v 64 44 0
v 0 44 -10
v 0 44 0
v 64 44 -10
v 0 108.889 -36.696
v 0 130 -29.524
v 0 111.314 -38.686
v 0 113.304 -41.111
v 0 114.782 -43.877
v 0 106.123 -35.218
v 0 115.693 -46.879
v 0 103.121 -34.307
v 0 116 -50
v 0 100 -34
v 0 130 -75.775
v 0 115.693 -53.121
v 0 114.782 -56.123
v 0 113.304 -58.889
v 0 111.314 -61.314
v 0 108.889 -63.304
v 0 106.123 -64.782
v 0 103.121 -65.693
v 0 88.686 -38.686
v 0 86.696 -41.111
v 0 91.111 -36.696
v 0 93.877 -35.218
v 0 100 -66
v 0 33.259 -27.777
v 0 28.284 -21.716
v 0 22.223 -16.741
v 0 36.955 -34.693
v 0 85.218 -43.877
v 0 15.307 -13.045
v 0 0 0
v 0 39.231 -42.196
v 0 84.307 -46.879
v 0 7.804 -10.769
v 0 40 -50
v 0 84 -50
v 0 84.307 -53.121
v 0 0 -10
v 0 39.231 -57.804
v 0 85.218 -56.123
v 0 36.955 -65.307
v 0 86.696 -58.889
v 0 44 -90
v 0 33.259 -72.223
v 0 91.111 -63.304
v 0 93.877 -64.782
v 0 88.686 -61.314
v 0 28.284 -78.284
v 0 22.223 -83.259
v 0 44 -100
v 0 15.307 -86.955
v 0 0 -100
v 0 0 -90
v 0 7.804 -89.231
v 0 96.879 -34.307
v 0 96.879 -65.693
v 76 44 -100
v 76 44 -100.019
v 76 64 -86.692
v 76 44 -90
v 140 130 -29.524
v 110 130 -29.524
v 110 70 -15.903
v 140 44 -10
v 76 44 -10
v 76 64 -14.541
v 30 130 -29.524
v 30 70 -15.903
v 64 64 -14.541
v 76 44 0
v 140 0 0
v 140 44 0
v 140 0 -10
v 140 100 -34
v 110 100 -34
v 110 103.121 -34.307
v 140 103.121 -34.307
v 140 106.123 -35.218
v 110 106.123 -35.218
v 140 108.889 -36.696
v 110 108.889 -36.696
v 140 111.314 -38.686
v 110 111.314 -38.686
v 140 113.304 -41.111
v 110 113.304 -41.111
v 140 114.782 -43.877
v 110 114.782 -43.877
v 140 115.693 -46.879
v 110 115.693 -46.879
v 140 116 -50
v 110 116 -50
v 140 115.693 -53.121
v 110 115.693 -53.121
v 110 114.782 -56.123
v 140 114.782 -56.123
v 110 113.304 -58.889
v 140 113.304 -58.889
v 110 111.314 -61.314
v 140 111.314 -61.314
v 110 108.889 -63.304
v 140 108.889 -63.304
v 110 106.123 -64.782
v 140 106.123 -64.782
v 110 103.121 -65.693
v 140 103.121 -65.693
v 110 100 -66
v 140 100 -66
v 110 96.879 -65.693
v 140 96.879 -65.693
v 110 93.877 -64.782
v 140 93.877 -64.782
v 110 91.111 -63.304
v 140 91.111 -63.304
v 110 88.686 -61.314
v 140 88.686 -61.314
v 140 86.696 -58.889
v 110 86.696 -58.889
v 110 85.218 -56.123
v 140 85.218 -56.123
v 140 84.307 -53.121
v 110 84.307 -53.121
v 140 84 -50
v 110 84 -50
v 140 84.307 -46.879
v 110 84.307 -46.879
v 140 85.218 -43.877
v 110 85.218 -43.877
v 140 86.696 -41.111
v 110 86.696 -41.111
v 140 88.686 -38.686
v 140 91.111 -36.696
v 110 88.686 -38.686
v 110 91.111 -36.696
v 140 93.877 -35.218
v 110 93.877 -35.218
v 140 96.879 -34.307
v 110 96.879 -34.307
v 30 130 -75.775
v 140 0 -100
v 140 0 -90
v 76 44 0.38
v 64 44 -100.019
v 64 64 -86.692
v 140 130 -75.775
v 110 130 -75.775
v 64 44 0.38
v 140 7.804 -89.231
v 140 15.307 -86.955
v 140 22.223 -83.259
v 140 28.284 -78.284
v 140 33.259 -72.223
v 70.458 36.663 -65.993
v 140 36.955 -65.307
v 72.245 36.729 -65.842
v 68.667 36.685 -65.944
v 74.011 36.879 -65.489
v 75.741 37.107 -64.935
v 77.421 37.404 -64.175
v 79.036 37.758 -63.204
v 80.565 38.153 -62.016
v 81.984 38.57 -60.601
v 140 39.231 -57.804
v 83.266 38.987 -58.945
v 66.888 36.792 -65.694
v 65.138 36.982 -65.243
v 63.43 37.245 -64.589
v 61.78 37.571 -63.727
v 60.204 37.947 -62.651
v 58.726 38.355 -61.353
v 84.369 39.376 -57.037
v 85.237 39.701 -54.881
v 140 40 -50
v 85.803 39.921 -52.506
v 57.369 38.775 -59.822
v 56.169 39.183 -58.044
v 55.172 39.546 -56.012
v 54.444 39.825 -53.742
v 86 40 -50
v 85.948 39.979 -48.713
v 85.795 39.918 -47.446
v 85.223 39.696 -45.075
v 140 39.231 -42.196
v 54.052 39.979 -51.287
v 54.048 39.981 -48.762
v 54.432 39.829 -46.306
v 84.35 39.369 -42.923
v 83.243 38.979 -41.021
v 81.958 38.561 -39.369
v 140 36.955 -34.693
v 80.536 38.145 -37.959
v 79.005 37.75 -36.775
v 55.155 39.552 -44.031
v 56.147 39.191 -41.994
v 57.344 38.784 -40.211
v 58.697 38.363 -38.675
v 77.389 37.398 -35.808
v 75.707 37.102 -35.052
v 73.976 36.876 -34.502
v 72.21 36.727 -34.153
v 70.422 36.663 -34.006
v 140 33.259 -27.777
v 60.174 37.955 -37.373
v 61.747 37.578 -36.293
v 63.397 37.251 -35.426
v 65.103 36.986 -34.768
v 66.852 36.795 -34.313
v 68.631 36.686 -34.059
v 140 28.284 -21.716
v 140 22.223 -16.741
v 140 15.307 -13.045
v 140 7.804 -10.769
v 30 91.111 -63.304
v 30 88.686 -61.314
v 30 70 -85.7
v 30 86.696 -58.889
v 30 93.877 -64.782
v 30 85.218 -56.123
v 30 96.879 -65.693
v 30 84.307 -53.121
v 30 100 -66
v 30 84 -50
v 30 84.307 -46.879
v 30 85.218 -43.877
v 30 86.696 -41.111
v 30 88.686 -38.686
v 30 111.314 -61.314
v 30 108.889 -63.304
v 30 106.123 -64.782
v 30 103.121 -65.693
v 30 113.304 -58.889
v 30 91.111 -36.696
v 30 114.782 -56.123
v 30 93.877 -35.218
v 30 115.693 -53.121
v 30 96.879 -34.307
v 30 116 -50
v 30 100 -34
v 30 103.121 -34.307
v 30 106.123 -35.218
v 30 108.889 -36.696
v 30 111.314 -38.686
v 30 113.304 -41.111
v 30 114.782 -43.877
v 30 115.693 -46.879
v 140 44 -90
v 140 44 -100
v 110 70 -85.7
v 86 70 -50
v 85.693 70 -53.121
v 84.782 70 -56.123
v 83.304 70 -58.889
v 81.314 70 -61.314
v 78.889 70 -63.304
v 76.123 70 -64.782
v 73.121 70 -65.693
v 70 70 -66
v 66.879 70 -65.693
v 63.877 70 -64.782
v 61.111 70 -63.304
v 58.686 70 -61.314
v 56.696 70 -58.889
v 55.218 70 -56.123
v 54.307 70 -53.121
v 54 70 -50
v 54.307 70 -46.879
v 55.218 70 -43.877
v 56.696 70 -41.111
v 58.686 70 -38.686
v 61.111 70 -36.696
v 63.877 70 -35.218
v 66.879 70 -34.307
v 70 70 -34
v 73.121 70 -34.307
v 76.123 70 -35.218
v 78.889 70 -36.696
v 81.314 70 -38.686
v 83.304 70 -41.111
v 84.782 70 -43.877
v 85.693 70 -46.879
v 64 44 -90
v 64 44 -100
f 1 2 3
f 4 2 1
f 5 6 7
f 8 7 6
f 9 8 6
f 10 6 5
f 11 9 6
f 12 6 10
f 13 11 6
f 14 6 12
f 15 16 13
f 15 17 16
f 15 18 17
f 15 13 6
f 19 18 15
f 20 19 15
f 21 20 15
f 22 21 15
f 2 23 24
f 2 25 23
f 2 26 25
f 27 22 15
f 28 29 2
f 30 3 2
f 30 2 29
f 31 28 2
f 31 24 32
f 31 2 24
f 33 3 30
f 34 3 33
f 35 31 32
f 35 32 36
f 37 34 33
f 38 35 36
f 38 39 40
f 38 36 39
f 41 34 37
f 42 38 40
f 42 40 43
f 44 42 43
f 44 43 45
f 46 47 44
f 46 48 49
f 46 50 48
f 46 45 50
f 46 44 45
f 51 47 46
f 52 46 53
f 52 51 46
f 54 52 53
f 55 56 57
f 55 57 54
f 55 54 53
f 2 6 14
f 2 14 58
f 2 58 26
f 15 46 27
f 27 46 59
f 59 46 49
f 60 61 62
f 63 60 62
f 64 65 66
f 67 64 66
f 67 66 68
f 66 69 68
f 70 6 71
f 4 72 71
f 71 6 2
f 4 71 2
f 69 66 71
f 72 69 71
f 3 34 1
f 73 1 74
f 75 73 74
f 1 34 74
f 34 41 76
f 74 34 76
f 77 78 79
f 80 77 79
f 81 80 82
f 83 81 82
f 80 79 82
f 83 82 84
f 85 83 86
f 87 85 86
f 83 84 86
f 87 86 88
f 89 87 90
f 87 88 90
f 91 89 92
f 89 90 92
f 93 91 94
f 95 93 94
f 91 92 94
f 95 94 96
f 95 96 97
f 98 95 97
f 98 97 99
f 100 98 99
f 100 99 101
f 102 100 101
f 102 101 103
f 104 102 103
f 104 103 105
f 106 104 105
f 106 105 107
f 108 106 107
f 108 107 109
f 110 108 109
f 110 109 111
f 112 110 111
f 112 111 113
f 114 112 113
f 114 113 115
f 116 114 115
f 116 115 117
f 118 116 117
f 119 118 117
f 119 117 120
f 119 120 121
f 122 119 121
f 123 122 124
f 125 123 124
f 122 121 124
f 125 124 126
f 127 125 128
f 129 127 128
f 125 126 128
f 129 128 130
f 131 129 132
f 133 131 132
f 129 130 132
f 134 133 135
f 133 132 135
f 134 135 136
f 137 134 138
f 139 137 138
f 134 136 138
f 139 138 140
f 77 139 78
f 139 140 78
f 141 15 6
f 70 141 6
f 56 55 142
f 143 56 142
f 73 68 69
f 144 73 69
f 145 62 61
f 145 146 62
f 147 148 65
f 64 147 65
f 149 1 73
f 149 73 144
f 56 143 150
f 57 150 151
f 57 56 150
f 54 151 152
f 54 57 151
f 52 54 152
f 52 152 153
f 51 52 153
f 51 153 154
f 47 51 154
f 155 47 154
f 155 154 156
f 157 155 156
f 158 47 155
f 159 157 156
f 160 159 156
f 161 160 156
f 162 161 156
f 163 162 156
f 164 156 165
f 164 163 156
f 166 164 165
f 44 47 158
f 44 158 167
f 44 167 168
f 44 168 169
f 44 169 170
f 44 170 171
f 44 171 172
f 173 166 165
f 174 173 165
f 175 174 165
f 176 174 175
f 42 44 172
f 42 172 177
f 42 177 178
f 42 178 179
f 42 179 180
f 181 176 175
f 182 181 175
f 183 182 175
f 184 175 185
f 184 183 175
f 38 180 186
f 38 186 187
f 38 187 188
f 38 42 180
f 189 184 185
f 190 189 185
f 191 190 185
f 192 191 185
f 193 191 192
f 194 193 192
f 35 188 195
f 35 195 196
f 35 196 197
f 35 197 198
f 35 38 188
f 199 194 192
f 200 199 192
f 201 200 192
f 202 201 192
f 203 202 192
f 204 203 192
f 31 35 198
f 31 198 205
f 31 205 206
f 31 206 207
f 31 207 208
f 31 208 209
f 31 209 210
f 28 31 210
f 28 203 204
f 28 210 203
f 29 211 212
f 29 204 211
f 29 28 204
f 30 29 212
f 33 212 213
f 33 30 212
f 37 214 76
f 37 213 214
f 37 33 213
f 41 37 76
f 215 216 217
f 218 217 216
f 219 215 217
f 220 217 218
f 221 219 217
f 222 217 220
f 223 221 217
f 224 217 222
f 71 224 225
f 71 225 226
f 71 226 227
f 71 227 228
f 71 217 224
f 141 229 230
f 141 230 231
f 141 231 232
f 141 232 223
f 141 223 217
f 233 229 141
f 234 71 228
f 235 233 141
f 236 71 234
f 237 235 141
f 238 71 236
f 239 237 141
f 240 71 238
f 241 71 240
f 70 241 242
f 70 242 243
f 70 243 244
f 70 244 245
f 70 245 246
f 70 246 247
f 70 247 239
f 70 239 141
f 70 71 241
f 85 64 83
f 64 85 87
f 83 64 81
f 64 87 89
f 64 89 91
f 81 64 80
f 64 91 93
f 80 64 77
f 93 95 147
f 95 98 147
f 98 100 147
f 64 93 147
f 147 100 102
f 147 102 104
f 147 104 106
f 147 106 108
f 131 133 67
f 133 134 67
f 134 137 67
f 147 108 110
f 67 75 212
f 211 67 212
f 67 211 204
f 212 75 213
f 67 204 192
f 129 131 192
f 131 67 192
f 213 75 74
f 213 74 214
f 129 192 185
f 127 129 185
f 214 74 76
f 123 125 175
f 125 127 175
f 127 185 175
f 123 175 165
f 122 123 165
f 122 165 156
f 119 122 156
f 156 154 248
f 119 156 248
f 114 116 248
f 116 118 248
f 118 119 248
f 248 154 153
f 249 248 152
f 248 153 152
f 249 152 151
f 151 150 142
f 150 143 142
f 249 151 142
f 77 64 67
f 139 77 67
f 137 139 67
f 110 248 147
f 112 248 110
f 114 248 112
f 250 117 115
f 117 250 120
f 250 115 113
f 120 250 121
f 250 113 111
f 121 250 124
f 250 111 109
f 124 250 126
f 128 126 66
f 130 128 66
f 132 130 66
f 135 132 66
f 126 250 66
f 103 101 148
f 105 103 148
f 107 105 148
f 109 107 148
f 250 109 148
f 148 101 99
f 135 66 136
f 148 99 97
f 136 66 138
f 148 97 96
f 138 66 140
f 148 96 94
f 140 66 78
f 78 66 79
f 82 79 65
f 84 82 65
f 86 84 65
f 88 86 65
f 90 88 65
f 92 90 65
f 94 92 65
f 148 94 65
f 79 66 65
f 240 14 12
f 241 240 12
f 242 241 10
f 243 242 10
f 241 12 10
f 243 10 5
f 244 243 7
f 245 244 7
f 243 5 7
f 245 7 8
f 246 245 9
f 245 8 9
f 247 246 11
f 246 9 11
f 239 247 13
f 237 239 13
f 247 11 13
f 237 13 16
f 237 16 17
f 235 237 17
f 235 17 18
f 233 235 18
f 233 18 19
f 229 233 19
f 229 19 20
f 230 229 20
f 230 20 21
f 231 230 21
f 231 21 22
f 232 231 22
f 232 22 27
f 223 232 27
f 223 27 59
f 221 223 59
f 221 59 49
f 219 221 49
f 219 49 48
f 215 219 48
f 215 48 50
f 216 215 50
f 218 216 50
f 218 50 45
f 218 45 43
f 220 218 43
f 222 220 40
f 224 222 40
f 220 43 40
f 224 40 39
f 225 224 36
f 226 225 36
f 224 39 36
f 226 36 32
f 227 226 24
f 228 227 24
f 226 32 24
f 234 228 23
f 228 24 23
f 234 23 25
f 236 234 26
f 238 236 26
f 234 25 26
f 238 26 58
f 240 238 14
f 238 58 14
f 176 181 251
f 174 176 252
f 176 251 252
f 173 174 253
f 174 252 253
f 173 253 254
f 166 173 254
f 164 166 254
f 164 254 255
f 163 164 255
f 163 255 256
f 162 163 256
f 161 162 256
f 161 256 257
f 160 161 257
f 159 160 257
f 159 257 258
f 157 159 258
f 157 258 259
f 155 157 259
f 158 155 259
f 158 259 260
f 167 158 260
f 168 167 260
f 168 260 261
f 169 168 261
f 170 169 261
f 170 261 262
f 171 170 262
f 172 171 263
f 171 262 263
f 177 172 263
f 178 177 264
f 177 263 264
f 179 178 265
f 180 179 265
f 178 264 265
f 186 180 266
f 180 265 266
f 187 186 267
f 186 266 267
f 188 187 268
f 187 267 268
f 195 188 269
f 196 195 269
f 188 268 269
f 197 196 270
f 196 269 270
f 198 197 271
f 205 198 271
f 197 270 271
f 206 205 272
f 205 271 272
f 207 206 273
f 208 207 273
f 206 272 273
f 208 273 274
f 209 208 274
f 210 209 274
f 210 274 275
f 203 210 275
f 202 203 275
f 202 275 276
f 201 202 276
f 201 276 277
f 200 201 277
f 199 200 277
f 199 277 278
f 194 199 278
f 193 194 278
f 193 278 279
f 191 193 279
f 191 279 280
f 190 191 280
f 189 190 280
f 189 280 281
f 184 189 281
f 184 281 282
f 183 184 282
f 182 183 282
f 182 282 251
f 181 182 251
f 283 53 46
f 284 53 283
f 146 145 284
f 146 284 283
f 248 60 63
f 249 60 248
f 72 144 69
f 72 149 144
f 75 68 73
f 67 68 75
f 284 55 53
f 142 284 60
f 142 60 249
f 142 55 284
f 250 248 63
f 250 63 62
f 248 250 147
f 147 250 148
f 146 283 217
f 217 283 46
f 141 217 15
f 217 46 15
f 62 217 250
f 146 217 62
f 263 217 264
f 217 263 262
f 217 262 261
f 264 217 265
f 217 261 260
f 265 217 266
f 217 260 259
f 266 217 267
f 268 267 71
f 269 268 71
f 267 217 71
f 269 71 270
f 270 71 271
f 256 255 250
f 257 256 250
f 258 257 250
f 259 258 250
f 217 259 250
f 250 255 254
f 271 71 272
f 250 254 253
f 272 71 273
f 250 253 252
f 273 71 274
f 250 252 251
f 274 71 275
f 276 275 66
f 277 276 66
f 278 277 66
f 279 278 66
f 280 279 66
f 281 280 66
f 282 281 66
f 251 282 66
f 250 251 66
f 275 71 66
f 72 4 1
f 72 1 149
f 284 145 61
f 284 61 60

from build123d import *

# Parameters (mm, degrees)
SKETCH1_W               = 140
SKETCH1_H               = 100
BOSS_EXTRUDE1_DEPTH     = 44
CUT_EXTRUDE2_DEPTH      = 1
CUT_EXTRUDE2_DEPTH_BACK = 141
BOSS_EXTRUDE2_DEPTH     = 140
SKETCH5_W               = 80
SKETCH5_H               = 60
CUT_EXTRUDE3_DEPTH      = 1
CUT_EXTRUDE3_DEPTH_BACK = 101
SKETCH6_R               = 16
CUT_EXTRUDE4_DEPTH      = 61
CUT_EXTRUDE4_DEPTH_BACK = 71
SKETCH7_R               = 16
CUT_EXTRUDE5_DEPTH      = 1.0000001
CUT_EXTRUDE5_DEPTH_BACK = 141.0000001
BOSS_EXTRUDE6_DEPTH     = 6
BOSS_EXTRUDE7_DEPTH     = 6


with BuildPart() as part:
    # Sketch1 → Boss-Extrude1 (new body)
    with BuildSketch(Plane(origin=(0, 0, 0), x_dir=(1, 0, 0), z_dir=(0, 1, 0))):
        with Locations((70, 50)):
            Rectangle(SKETCH1_W, SKETCH1_H)
    extrude(amount=BOSS_EXTRUDE1_DEPTH)

    # Sketch2 → Cut-Extrude2 (cut, two sides)
    with BuildSketch(Plane.ZY) as cut_extrude2_sk:
        with BuildLine():
            Line((-90, -210.359676582), (-90, 0))
            ThreePointArc((-90, 0), (-50, 40), (-10, 0))
            Line((-10, 0), (-10, -210.359676582))
            Line((-10, -210.359676582), (-10, -631.079029746))
            Line((-10, -631.079029746), (-90, -631.079029746))
            Line((-90, -631.079029746), (-90, -210.359676582))
        make_face()
    extrude(amount=CUT_EXTRUDE2_DEPTH, mode=Mode.SUBTRACT)
    extrude(cut_extrude2_sk.sketch, amount=-CUT_EXTRUDE2_DEPTH_BACK, mode=Mode.SUBTRACT)

    # Sketch3 → Boss-Extrude2 (add)
    with BuildSketch(Plane.ZY):
        Polygon((-90, 44), (-75.775374972, 130), (-29.52448448, 130), (-10, 44), align=None)
    extrude(amount=-BOSS_EXTRUDE2_DEPTH)

    # Sketch5 → Cut-Extrude3 (cut, two sides)
    with BuildSketch(Plane.XY) as cut_extrude3_sk:
        with Locations((70, 100)):
            Rectangle(SKETCH5_W, SKETCH5_H)
    extrude(amount=CUT_EXTRUDE3_DEPTH, mode=Mode.SUBTRACT)
    extrude(cut_extrude3_sk.sketch, amount=-CUT_EXTRUDE3_DEPTH_BACK, mode=Mode.SUBTRACT)

    # Sketch6 → Cut-Extrude4 (cut, two sides)
    with BuildSketch(Plane(origin=(0, 70, 0), x_dir=(1, 0, 0), z_dir=(0, 1, 0))) as cut_extrude4_sk:
        with Locations((70, 50)):
            Circle(SKETCH6_R)
    extrude(amount=CUT_EXTRUDE4_DEPTH, mode=Mode.SUBTRACT)
    extrude(cut_extrude4_sk.sketch, amount=-CUT_EXTRUDE4_DEPTH_BACK, mode=Mode.SUBTRACT)

    # Sketch7 → Cut-Extrude5 (cut, two sides)
    with BuildSketch(Plane.ZY) as cut_extrude5_sk:
        with Locations((-50, 100)):
            Circle(SKETCH7_R)
    extrude(amount=CUT_EXTRUDE5_DEPTH, mode=Mode.SUBTRACT)
    extrude(cut_extrude5_sk.sketch, amount=-CUT_EXTRUDE5_DEPTH_BACK, mode=Mode.SUBTRACT)

    # Sketch15 → Boss-Extrude6 (add, symmetric)
    with BuildSketch(Plane.ZY.offset(-70)):
        Polygon((-14.540577786, 64), (-10, 44), (0.380318398, 44), align=None)
    extrude(amount=BOSS_EXTRUDE6_DEPTH, both=True)

    # Sketch17 → Boss-Extrude7 (add, symmetric)
    with BuildSketch(Plane.ZY.offset(-70)):
        Polygon((-86.691947668, 64), (-100.019037355, 44), (-90, 44), align=None)
    extrude(amount=BOSS_EXTRUDE7_DEPTH, both=True)


solid = part.part
